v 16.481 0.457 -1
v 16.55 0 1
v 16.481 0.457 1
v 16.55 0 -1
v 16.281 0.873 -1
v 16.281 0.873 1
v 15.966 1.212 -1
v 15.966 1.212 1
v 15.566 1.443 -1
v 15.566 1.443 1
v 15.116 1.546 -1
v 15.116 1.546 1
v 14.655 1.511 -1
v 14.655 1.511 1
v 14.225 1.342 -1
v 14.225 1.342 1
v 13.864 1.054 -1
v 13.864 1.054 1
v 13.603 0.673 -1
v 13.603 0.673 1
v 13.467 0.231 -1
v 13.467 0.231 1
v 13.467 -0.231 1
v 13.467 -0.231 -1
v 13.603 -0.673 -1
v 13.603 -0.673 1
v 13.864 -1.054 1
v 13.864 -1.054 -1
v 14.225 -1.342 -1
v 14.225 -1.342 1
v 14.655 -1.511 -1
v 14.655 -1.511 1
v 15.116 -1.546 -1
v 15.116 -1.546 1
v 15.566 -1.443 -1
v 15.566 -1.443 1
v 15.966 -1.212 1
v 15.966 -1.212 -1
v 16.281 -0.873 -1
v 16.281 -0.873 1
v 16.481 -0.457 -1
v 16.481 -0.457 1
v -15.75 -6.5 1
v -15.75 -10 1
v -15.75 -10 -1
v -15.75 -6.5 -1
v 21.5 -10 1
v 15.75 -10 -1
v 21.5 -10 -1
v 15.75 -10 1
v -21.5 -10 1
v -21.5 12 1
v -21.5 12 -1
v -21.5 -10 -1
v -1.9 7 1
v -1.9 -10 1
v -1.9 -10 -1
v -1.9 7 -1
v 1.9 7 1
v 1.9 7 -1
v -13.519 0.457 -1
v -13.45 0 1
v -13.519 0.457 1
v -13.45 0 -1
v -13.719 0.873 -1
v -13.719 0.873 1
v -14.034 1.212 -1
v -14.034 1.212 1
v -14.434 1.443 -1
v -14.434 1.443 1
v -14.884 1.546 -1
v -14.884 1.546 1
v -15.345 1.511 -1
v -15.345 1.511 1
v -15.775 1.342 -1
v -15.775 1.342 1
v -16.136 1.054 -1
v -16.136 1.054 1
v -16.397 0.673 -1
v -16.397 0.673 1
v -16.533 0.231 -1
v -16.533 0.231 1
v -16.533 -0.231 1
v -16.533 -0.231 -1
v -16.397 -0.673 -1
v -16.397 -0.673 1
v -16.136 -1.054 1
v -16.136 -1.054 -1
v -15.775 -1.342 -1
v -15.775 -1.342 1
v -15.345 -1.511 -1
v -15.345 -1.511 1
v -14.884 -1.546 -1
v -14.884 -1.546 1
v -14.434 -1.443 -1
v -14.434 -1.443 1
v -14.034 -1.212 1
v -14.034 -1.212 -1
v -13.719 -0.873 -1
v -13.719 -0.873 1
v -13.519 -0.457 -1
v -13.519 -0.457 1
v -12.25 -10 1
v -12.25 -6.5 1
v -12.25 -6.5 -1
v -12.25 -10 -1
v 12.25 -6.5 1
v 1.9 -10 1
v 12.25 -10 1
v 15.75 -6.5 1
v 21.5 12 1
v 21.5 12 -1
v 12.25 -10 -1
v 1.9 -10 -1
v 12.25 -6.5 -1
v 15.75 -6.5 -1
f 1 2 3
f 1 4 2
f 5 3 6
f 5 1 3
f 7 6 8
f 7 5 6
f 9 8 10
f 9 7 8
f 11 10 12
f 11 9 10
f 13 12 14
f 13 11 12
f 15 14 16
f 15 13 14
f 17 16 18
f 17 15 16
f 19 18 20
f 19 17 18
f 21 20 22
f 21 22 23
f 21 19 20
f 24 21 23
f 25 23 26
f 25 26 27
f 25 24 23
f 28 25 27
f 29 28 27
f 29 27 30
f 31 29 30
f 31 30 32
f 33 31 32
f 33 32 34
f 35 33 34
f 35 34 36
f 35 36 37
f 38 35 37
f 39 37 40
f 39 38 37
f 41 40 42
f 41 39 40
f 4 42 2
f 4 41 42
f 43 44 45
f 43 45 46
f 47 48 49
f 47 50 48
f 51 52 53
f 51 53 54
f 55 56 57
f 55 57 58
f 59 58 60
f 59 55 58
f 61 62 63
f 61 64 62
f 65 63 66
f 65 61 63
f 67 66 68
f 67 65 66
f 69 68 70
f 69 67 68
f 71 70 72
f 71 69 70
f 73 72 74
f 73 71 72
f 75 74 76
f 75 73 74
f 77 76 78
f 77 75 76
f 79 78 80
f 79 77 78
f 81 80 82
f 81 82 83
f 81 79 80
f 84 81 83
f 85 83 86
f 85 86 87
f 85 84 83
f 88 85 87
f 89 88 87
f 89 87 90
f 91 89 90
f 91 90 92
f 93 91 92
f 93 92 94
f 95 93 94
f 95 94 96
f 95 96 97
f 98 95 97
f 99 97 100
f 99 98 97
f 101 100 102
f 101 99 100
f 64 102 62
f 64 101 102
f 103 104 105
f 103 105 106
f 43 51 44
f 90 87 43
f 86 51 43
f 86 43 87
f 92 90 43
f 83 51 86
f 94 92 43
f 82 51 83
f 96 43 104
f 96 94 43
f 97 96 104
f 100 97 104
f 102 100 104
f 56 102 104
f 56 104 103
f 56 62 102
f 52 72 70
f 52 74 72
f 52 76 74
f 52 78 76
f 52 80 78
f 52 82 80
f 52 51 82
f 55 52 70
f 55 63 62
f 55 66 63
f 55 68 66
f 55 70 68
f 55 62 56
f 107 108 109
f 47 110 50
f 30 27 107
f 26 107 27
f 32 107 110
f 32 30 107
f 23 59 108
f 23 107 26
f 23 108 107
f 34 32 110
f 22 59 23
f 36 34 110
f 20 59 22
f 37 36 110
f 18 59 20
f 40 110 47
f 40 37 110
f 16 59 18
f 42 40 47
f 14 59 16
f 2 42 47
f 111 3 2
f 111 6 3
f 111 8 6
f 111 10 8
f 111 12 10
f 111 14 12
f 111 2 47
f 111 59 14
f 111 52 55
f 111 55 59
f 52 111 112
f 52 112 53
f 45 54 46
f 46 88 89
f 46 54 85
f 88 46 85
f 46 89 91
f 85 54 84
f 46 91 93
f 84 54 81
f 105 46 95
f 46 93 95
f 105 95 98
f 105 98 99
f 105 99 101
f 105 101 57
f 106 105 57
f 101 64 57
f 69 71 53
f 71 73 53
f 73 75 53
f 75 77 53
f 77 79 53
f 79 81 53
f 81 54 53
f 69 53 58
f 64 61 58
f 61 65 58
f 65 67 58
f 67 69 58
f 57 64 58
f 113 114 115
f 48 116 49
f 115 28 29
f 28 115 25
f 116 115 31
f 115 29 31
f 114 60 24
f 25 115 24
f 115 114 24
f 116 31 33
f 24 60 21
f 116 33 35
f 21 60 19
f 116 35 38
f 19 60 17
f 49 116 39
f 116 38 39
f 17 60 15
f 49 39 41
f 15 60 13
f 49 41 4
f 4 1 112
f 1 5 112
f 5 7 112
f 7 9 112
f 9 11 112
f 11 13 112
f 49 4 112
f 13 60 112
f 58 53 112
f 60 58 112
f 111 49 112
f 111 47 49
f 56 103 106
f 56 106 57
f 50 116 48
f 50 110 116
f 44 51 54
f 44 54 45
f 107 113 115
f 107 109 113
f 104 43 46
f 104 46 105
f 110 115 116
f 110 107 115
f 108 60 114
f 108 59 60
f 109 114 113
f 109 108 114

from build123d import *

# Parameters (mm, degrees)
SKETCH_R  = 1.55
PAD_DEPTH = 1


with BuildPart() as part:
    # Sketch → Pad (new body, symmetric)
    with BuildSketch(Plane.XY):
        Polygon((21.5, -10), (21.5, 12), (-21.5, 12), (-21.5, -10), (-15.75, -10), (-15.75, -6.5), (-12.25, -6.5), (-12.25, -10), (-1.9, -10), (-1.9, 7), (1.9, 7), (1.9, -10), (12.25, -10), (12.25, -6.5), (15.75, -6.5), (15.75, -10), align=None)
        with Locations((15, 0)):
            Circle(SKETCH_R, mode=Mode.SUBTRACT)
        with Locations((-15, 0)):
            Circle(SKETCH_R, mode=Mode.SUBTRACT)
    extrude(amount=PAD_DEPTH, both=True)


solid = part.part
